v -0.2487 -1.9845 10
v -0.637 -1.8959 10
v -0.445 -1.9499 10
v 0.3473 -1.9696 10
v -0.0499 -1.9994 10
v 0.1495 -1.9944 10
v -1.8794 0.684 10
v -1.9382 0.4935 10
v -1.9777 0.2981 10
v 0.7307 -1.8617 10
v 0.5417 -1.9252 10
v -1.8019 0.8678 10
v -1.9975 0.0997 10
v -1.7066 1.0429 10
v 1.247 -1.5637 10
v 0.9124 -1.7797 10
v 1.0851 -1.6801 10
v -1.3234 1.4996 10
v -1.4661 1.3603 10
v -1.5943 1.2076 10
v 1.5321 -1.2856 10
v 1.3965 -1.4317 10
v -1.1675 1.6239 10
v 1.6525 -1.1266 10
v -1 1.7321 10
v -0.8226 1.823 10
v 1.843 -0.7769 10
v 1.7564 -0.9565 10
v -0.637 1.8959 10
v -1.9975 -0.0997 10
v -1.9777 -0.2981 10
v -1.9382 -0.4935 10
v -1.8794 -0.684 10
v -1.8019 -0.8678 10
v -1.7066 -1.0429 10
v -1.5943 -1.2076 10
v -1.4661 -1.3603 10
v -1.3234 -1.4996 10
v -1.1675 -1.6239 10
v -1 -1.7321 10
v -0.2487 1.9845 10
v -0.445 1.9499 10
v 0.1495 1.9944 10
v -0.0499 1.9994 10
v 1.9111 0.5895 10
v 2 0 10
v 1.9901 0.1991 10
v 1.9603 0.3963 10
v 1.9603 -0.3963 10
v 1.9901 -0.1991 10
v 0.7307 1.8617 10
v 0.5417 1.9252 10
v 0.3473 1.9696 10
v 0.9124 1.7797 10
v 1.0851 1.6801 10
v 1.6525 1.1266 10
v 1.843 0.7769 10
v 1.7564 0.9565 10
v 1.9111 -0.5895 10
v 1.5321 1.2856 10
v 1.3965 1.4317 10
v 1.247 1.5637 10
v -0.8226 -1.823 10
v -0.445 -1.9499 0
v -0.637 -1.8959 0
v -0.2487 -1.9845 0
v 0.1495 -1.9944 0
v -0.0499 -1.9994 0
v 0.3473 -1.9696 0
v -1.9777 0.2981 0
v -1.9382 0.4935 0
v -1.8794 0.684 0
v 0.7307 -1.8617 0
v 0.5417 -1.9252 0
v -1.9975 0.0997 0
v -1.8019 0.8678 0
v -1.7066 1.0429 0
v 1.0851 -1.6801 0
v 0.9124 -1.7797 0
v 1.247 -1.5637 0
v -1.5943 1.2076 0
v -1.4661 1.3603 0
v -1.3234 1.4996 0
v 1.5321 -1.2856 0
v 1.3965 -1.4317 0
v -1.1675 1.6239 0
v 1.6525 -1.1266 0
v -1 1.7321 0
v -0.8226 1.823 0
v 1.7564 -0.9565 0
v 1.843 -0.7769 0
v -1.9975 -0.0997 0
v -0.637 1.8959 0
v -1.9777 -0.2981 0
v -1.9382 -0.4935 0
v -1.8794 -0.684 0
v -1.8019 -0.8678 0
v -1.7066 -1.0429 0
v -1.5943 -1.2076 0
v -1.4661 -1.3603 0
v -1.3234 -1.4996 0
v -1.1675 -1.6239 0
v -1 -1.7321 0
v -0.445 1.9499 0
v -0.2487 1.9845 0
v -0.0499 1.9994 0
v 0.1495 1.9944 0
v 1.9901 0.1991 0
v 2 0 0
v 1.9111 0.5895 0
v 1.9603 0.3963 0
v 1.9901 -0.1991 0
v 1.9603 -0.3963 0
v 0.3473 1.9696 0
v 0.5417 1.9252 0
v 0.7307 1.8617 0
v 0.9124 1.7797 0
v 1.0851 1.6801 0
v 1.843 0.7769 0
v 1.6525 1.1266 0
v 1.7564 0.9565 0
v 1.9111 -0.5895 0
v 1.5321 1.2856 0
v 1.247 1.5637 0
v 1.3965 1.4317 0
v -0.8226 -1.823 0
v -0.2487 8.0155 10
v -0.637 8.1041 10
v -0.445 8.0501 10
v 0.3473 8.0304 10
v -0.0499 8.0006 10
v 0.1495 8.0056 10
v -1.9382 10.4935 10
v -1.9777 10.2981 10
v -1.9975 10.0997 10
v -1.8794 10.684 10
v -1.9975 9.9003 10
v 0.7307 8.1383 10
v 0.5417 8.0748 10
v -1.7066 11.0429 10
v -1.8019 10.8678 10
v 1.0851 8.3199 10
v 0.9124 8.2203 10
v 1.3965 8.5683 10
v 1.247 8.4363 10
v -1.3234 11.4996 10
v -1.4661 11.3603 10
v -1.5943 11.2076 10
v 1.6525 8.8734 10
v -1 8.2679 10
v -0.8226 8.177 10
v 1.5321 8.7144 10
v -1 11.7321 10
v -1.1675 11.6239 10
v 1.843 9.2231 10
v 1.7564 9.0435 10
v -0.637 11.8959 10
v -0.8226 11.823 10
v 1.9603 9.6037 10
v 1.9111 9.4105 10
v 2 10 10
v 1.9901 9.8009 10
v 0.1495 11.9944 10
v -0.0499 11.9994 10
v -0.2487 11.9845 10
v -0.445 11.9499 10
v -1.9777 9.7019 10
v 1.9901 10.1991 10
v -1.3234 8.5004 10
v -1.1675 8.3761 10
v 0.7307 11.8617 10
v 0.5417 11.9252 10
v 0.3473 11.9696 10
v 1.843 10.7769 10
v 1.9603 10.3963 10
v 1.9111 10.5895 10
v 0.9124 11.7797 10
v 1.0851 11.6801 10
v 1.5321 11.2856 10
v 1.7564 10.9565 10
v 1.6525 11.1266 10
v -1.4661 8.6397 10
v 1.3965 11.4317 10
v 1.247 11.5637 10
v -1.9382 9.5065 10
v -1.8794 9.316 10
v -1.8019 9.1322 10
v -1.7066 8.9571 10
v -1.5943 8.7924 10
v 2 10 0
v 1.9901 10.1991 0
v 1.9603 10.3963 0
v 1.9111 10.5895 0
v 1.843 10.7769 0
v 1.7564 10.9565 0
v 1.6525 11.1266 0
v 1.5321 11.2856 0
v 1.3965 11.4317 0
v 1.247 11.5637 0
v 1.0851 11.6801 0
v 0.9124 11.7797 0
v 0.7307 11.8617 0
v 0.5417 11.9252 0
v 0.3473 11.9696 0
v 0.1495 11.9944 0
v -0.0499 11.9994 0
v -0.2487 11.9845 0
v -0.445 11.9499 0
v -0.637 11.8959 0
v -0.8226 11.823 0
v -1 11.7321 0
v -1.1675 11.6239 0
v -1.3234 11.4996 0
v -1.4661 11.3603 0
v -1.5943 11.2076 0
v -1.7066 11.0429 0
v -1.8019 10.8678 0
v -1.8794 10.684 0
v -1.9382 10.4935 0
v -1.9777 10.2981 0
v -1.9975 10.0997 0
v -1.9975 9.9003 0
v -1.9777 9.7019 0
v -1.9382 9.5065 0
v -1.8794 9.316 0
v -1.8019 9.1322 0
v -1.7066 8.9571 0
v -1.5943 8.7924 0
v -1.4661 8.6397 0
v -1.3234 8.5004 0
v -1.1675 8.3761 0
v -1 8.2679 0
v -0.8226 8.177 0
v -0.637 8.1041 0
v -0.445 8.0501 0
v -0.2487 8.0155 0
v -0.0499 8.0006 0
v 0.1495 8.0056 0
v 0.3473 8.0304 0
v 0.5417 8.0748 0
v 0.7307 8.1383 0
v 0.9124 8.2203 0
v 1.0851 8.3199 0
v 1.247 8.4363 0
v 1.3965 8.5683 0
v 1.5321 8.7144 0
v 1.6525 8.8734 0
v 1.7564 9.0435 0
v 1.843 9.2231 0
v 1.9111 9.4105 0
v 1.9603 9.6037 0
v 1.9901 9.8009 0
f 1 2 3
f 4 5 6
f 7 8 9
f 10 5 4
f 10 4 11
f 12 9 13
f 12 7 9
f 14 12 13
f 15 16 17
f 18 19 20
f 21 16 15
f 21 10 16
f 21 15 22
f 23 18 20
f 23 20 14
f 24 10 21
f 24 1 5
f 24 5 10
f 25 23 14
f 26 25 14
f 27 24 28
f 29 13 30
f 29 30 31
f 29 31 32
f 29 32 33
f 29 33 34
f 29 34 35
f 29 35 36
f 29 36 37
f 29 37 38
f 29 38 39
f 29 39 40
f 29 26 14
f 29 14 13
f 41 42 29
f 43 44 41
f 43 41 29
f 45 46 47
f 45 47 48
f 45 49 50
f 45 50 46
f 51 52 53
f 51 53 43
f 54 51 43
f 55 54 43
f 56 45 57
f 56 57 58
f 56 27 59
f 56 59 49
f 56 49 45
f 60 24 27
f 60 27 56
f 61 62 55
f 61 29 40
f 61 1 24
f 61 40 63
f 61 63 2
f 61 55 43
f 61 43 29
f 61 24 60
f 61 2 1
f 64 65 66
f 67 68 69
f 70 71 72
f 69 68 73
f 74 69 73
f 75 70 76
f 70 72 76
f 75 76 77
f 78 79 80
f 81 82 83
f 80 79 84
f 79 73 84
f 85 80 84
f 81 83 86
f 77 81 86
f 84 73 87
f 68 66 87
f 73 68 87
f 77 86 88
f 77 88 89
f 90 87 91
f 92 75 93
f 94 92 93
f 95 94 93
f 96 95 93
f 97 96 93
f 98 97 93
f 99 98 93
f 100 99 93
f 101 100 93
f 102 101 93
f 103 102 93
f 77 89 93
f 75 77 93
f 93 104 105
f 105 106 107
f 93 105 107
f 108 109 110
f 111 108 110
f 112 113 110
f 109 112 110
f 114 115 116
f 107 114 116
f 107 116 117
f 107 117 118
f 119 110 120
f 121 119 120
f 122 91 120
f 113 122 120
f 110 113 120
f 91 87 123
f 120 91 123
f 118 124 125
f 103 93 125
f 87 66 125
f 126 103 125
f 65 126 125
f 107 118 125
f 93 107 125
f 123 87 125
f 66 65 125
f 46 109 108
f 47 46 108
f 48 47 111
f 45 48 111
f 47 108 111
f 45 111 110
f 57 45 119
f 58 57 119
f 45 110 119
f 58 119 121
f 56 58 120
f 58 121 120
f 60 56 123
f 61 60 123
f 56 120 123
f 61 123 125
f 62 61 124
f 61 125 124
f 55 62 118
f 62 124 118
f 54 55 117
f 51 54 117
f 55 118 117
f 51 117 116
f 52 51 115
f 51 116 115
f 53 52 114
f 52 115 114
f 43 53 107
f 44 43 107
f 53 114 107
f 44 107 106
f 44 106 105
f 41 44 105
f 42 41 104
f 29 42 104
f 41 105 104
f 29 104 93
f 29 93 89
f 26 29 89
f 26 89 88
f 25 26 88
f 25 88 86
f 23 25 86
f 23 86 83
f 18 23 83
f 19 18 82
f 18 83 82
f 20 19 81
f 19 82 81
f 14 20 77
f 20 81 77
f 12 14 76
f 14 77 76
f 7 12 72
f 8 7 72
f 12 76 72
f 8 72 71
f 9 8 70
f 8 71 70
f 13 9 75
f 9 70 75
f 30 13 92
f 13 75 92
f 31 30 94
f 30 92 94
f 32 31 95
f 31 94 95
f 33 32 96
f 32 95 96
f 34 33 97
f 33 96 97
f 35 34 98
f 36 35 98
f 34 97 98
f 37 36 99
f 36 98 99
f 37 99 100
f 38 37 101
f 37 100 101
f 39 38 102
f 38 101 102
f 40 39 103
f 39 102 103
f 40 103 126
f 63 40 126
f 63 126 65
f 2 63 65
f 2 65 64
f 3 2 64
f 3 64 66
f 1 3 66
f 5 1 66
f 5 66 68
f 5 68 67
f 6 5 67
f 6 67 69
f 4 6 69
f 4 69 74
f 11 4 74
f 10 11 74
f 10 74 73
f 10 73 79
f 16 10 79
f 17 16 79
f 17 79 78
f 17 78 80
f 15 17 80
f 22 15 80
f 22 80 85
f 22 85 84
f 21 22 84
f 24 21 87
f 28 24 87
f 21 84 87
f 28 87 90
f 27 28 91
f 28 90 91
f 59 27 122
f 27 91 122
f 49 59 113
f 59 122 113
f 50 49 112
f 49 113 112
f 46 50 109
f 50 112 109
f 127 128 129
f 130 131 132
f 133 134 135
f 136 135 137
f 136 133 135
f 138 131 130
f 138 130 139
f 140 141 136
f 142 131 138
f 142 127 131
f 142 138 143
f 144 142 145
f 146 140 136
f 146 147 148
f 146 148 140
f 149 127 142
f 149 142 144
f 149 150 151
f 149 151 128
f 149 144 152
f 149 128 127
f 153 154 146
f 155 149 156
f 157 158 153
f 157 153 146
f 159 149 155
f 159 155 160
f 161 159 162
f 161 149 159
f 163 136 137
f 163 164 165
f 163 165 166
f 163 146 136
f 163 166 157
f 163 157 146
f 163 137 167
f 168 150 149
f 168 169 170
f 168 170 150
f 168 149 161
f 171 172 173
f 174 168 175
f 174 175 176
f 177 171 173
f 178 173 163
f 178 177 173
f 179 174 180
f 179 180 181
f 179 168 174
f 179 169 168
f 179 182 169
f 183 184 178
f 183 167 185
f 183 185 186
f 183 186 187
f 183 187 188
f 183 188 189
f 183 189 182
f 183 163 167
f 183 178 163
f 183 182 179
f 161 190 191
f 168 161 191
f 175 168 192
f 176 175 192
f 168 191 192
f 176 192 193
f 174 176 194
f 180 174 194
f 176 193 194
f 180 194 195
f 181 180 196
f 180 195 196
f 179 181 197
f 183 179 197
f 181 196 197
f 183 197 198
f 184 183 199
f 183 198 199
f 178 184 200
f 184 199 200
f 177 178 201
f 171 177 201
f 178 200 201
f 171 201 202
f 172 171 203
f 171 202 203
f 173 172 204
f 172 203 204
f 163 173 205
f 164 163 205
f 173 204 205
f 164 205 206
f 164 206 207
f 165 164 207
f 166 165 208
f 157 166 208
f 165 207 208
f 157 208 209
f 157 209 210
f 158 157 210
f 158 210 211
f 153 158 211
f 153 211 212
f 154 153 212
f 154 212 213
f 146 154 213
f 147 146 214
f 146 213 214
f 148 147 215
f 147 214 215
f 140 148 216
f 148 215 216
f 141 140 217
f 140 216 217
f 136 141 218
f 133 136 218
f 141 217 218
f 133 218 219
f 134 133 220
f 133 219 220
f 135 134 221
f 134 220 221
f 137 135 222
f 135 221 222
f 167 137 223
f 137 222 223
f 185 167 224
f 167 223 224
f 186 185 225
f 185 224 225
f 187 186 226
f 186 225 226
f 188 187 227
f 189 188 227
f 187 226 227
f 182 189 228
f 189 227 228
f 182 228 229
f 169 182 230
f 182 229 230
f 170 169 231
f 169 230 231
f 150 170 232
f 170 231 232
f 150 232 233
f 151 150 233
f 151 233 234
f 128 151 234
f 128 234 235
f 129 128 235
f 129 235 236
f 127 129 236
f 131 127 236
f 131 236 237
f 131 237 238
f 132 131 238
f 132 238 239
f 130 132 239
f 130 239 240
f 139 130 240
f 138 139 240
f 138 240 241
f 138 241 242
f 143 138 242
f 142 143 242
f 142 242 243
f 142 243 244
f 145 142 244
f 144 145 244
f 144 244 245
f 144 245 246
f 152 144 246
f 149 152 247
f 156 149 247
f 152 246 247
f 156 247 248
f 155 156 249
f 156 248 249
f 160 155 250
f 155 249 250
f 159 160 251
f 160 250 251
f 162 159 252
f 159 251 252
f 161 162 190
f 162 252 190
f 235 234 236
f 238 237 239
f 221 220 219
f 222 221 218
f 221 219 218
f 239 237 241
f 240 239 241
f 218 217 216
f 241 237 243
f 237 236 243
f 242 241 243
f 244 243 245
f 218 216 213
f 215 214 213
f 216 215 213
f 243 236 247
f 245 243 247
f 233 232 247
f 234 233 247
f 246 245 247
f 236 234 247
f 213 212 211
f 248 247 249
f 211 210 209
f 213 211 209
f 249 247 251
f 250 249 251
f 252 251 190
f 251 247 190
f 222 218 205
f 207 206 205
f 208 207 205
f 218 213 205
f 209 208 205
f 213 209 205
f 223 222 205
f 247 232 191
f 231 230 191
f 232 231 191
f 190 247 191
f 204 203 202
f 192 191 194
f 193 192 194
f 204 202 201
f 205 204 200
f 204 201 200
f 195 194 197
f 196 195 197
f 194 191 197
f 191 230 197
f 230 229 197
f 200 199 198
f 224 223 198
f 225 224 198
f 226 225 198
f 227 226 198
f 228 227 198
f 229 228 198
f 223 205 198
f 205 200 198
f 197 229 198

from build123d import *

# Parameters (mm, degrees)
CYLINDER001_R     = 2
CYLINDER001_DEPTH = 10
CYLINDER_R        = 2
CYLINDER_DEPTH    = 10


with BuildPart() as block_hole2:
    # Cylinder001 → Cylinder001 (new body)
    with BuildSketch(Plane(origin=(0, 10, 0), x_dir=(1, 0, 0), z_dir=(0, 0, 1))):
        Circle(CYLINDER001_R)
    extrude(amount=CYLINDER001_DEPTH)


with BuildPart() as block_holes_c:
    # Cylinder → Cylinder (new body)
    with BuildSketch(Plane.XY):
        Circle(CYLINDER_R)
    extrude(amount=CYLINDER_DEPTH)

    # Fusion: union block_hole2
    add(block_hole2.part)


solid = block_holes_c.part
